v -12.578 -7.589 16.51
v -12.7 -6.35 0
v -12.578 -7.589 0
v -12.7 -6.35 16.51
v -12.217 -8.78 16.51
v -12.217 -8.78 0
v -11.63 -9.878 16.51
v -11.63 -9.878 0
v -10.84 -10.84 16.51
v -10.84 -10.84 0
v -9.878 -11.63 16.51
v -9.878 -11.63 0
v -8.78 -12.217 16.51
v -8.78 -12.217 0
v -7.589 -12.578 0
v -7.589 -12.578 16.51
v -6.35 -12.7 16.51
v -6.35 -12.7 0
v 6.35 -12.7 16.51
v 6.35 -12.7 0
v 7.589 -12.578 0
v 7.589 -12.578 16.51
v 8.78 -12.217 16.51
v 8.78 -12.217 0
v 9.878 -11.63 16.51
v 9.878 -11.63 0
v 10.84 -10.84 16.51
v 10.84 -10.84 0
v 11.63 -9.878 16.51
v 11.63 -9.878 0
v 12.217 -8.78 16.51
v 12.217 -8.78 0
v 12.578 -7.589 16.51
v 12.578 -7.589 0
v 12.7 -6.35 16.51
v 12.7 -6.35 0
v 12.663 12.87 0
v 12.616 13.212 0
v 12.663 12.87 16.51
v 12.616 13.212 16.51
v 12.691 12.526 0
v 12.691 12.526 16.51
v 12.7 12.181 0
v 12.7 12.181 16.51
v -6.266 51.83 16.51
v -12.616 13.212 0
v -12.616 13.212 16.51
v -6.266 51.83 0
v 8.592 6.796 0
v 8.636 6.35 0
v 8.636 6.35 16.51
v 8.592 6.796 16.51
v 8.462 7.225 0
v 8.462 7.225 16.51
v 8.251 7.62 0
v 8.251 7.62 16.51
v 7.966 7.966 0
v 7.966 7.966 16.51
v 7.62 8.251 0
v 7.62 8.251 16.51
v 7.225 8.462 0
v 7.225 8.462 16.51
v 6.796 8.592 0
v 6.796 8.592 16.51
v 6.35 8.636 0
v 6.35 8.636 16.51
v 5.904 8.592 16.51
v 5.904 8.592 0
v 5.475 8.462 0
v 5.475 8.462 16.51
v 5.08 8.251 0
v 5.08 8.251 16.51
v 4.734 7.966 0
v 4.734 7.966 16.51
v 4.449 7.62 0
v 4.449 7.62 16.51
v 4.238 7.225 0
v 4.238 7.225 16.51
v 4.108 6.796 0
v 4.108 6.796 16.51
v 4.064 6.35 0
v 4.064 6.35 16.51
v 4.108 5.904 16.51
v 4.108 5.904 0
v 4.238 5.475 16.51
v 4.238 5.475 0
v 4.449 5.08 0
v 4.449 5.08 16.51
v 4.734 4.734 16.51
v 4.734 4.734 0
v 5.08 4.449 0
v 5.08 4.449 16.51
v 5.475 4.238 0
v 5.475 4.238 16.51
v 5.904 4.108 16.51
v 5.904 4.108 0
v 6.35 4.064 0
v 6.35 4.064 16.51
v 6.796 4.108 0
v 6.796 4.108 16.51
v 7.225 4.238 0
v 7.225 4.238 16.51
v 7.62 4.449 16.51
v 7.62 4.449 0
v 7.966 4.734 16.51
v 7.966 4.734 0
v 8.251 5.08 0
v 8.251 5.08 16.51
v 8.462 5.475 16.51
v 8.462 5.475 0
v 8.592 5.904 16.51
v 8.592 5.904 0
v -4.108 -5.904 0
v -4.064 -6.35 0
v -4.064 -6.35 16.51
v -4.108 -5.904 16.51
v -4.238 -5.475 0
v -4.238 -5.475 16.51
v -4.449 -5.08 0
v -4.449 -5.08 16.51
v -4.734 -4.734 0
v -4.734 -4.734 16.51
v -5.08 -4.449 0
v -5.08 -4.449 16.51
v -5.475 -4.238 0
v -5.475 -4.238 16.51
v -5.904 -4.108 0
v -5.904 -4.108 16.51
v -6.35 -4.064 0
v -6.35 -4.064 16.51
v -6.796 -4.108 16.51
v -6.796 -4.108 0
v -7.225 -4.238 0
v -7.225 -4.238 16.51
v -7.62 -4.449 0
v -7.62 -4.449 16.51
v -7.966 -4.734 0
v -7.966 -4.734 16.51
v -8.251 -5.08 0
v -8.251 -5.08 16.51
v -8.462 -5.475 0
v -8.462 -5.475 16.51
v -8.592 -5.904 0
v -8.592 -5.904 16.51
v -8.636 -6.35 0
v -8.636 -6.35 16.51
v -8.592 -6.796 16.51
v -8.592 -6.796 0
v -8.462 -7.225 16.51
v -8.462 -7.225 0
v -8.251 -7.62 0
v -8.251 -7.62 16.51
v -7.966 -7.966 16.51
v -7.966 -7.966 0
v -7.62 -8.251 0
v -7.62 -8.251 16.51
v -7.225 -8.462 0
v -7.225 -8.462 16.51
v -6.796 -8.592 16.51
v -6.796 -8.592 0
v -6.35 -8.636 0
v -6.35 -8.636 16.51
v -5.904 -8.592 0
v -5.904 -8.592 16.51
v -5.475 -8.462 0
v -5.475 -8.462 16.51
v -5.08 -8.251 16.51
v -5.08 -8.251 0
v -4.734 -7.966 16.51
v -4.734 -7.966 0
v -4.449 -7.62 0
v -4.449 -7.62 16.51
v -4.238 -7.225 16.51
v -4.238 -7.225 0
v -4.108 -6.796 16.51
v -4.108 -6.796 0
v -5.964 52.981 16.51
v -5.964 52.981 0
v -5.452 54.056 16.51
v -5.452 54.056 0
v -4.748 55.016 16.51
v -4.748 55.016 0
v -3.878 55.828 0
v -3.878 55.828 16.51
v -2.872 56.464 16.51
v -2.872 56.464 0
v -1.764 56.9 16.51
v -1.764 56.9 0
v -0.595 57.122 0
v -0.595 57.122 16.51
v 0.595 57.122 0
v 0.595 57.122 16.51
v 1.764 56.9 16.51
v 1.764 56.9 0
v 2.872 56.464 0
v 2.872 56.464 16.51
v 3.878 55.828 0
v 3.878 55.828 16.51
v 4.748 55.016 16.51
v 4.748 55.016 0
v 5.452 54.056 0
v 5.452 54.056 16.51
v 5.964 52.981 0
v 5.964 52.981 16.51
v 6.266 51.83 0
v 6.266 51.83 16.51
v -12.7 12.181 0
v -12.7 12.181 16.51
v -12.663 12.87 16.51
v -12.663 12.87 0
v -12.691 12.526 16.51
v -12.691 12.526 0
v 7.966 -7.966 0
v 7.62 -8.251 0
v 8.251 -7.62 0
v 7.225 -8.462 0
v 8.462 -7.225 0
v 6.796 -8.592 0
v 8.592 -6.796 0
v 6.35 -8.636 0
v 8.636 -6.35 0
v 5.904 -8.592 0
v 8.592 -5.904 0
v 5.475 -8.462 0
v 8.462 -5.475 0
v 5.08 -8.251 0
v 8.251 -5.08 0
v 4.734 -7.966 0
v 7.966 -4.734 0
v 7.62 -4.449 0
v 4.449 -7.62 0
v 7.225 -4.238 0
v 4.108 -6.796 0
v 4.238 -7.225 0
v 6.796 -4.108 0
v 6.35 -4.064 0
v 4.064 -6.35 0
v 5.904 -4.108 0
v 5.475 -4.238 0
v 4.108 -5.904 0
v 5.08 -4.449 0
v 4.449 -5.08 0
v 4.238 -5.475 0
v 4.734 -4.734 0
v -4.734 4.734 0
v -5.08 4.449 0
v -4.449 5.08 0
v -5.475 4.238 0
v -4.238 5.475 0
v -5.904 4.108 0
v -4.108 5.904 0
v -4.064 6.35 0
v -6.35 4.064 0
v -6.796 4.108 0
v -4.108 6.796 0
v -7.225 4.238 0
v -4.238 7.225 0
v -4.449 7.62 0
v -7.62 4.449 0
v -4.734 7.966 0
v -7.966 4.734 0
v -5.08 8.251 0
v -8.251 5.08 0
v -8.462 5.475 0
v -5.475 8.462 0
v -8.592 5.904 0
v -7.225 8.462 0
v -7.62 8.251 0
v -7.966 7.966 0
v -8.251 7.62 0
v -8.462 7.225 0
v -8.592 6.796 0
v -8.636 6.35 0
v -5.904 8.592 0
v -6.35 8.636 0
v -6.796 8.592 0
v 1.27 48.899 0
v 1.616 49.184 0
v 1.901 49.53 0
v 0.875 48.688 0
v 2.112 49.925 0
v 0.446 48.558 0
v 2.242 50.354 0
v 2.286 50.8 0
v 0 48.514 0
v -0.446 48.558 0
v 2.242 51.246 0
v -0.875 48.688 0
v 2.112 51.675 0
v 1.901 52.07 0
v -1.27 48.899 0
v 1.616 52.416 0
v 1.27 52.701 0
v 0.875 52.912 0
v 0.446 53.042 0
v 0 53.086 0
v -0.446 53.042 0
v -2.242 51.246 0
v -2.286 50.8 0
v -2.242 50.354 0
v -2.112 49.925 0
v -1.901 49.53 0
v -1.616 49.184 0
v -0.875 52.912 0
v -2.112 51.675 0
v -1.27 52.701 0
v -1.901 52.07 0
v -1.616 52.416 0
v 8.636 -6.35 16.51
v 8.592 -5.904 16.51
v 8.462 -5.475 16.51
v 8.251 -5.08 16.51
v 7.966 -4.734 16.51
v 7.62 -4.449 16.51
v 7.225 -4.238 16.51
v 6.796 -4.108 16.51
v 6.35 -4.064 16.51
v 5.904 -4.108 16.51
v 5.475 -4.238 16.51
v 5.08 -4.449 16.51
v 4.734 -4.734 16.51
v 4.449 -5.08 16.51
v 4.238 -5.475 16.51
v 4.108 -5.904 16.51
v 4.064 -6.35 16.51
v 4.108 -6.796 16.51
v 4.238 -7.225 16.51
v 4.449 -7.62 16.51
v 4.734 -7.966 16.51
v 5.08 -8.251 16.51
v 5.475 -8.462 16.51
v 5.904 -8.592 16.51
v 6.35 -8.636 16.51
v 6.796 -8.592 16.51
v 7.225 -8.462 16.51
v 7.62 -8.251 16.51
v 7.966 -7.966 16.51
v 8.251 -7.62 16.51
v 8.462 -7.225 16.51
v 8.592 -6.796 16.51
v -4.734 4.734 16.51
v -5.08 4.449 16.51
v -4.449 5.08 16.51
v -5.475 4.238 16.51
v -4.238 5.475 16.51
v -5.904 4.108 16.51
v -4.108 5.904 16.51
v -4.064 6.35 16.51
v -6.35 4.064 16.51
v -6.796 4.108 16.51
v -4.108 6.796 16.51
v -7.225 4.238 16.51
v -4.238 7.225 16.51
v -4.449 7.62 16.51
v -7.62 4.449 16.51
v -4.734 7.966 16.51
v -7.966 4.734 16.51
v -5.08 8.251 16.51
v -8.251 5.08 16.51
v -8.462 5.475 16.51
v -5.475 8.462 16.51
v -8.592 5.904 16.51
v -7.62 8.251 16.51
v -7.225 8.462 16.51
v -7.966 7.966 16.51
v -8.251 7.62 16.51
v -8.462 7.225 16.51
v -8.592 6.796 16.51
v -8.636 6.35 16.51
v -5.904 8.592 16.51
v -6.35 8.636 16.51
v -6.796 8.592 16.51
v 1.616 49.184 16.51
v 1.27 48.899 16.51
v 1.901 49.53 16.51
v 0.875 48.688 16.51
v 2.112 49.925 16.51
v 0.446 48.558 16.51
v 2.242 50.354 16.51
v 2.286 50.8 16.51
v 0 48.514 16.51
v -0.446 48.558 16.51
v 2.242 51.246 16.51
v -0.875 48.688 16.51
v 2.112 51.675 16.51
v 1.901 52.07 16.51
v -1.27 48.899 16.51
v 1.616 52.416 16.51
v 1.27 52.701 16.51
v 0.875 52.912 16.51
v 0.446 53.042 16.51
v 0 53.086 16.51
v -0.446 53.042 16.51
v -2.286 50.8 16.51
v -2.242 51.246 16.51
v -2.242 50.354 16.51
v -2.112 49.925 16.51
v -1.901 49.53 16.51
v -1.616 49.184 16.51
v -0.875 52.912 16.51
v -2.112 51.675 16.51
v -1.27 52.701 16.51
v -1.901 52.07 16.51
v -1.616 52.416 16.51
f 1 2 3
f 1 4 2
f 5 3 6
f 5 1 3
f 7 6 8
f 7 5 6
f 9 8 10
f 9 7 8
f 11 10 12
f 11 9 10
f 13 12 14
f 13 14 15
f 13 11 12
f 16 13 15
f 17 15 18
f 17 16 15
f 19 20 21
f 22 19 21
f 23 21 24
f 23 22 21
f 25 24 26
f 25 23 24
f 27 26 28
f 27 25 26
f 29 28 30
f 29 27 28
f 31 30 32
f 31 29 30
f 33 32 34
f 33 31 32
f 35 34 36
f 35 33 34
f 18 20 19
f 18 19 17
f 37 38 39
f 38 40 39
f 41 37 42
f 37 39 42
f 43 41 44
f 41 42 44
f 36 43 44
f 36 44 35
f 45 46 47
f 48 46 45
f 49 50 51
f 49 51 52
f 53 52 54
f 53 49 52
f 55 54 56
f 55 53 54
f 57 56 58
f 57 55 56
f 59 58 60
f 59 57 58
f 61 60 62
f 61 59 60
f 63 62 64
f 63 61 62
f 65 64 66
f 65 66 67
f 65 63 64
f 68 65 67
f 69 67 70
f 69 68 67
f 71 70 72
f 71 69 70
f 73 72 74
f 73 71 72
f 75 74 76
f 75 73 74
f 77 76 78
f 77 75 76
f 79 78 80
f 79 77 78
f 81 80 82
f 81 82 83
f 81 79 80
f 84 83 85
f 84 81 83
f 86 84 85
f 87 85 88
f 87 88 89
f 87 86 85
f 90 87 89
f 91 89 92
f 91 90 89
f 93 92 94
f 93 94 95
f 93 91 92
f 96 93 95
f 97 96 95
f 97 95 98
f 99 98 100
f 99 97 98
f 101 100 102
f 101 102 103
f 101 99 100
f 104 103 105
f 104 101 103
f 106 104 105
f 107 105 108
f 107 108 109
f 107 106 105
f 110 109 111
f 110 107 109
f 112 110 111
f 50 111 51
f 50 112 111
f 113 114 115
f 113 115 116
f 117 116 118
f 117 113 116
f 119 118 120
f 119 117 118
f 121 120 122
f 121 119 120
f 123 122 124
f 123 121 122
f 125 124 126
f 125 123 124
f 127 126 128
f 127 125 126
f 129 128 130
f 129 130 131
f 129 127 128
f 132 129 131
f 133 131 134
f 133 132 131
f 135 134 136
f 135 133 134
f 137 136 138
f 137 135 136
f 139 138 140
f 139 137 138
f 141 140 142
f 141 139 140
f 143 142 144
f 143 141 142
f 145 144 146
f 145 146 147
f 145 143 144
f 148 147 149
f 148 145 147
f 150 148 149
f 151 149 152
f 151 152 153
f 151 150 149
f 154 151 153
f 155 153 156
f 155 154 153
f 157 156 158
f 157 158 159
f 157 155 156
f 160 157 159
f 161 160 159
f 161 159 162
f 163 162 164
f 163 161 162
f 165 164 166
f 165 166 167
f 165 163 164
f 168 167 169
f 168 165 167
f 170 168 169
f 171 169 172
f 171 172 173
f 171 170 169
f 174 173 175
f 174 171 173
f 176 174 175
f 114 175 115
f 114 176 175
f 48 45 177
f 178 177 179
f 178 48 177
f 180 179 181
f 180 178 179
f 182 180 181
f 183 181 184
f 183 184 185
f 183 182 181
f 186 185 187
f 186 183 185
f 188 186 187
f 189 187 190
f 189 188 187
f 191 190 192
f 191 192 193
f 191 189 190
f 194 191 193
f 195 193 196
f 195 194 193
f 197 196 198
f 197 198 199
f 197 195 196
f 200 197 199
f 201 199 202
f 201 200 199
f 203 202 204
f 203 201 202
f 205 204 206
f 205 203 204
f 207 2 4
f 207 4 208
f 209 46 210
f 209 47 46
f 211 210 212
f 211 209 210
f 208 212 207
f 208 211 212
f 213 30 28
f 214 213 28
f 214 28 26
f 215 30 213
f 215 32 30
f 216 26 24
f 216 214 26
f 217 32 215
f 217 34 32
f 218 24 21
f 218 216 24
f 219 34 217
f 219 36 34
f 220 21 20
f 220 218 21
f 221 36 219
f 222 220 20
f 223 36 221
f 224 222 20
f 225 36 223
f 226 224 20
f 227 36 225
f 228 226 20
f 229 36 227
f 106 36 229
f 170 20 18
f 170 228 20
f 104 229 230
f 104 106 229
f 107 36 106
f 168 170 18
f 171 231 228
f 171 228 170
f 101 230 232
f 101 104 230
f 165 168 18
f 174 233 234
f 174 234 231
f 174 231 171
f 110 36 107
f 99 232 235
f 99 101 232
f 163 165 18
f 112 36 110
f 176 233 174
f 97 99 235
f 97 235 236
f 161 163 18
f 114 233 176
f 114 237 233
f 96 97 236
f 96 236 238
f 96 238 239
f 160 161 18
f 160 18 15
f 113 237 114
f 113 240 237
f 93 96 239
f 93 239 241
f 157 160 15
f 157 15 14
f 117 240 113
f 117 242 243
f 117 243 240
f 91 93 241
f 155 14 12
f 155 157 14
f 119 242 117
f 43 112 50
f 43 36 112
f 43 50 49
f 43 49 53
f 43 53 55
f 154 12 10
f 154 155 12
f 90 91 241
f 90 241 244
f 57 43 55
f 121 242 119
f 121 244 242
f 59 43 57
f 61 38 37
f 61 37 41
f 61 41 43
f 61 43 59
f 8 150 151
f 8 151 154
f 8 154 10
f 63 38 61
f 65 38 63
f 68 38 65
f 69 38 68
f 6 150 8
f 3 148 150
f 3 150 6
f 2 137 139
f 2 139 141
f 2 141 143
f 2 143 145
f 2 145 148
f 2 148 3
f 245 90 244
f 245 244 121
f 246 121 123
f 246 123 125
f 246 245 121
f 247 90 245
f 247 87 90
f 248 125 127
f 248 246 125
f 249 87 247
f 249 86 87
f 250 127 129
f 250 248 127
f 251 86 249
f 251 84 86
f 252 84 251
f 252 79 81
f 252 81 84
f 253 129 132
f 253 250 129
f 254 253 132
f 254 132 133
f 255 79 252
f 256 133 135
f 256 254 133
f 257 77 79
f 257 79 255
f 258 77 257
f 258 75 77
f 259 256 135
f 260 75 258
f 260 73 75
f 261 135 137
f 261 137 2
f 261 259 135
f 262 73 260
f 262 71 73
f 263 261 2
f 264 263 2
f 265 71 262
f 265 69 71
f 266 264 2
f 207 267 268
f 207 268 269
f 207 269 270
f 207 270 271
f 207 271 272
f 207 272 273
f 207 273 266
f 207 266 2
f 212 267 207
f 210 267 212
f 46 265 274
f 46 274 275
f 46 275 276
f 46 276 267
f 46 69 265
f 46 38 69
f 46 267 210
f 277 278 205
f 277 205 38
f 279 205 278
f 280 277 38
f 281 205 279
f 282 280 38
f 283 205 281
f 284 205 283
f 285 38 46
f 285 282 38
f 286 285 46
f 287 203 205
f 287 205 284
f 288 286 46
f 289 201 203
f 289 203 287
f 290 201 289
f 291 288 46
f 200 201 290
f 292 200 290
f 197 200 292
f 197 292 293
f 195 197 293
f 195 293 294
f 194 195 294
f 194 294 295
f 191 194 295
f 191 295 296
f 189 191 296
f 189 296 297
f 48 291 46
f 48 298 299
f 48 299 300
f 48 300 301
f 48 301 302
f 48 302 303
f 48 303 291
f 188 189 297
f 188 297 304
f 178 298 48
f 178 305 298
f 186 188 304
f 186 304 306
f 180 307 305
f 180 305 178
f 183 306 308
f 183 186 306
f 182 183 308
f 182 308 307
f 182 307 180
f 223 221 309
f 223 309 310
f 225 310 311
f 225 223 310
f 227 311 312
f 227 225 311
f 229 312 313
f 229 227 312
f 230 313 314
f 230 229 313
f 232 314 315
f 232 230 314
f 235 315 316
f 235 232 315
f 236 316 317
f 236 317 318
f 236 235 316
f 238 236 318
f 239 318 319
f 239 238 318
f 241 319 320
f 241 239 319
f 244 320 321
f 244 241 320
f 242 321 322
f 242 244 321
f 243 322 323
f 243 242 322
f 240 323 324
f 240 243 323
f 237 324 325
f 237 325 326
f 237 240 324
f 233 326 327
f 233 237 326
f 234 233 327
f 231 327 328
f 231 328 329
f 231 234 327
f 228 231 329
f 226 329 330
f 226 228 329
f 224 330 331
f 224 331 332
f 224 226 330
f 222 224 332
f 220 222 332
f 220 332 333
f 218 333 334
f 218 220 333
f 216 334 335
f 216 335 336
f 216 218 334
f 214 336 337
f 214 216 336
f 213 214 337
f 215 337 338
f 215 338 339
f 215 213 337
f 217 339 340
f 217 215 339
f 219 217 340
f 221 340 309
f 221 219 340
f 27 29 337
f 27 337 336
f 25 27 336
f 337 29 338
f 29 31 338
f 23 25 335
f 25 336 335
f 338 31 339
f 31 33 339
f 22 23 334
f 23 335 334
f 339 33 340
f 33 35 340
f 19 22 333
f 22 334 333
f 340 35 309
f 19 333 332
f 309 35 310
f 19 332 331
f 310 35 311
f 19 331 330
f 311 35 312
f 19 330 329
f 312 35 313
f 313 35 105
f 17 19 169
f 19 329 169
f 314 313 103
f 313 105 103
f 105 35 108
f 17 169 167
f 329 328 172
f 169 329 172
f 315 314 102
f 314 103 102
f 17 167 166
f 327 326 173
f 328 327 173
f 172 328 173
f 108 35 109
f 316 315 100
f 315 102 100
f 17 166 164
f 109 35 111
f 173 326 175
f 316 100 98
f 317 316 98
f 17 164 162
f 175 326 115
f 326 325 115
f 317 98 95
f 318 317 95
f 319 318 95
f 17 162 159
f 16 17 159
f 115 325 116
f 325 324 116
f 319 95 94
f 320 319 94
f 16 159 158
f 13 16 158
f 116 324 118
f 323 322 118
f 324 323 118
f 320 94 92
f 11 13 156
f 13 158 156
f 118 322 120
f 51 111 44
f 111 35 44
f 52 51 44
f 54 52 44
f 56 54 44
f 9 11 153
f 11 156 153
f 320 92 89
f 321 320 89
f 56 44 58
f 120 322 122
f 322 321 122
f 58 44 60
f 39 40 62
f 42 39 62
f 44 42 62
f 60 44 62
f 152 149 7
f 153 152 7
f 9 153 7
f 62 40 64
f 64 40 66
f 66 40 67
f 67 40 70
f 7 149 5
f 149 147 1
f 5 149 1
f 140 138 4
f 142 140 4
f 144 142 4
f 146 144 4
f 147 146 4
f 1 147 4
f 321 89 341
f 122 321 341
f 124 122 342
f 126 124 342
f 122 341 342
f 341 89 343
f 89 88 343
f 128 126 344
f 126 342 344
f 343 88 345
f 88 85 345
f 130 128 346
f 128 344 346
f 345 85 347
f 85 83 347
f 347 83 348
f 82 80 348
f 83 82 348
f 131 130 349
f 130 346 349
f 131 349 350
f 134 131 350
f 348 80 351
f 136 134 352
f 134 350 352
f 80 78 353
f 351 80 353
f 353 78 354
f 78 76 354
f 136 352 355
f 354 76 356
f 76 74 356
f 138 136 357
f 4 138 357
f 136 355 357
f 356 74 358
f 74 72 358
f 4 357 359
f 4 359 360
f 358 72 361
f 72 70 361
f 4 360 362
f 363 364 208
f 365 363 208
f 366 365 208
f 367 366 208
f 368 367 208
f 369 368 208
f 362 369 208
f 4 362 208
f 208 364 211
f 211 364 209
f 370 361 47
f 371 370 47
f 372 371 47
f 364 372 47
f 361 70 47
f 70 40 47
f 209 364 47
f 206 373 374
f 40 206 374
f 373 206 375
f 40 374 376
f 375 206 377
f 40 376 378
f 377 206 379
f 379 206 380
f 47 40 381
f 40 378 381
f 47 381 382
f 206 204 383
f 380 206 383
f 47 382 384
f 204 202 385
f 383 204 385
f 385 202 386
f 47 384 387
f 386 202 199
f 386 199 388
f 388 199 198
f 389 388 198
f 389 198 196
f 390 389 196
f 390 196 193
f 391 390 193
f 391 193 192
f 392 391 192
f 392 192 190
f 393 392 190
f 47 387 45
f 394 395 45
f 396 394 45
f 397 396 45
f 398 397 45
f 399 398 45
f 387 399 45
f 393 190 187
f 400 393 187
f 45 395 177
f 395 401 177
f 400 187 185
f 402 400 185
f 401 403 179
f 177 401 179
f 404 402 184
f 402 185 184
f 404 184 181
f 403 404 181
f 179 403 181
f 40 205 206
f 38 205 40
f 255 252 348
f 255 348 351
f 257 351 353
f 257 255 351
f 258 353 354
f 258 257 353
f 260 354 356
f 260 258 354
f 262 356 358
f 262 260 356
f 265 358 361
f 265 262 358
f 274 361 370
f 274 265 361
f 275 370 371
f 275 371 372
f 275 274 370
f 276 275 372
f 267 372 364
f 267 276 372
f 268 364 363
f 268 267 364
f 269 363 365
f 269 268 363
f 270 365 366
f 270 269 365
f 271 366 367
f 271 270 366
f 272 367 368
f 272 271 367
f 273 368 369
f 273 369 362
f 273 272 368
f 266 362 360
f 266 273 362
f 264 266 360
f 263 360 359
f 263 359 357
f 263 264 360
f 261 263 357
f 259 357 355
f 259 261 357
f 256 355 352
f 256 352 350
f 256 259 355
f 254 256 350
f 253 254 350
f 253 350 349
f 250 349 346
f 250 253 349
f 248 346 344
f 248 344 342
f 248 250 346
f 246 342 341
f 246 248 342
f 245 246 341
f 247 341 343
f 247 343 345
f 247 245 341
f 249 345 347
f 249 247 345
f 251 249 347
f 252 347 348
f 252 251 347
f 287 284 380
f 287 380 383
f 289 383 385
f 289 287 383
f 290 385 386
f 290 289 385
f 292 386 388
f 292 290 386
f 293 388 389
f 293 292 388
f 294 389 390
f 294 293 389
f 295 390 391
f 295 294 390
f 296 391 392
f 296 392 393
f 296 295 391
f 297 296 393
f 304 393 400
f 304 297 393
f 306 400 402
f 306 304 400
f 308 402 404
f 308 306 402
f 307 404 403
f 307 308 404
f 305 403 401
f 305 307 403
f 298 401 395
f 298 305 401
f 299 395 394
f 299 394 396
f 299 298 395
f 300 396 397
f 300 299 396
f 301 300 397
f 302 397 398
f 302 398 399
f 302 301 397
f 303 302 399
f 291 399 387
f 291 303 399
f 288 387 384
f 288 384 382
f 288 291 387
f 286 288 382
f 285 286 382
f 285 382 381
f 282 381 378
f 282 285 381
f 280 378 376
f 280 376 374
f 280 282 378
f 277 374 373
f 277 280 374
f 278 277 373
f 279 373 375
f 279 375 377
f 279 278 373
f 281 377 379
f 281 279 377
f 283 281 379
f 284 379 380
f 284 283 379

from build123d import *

# Parameters (mm, degrees)
SKETCH1_R           = 2.286
BOSS_EXTRUDE1_DEPTH = 16.51
FILLET1_R           = 6.35


with BuildPart() as part:
    # Sketch1 → Boss-Extrude1 (new body)
    with BuildSketch(Plane.XY):
        with BuildLine():
            Line((-12.7, 12.7), (-6.265860593, 51.830286864))
            ThreePointArc((-6.265860593, 51.830286864), (0, 57.15), (6.265860593, 51.830286864))
            Line((6.265860593, 51.830286864), (12.7, 12.7))
            Line((12.7, 12.7), (12.7, -12.7))
            Line((12.7, -12.7), (-12.7, -12.7))
            Line((-12.7, -12.7), (-12.7, 12.7))
        make_face()
        with Locations((-6.35, -6.35)):
            Circle(SKETCH1_R, mode=Mode.SUBTRACT)
        with Locations((0, 50.8)):
            Circle(SKETCH1_R, mode=Mode.SUBTRACT)
        with Locations((6.35, -6.35)):
            Circle(SKETCH1_R, mode=Mode.SUBTRACT)
        with Locations((6.35, 6.35)):
            Circle(SKETCH1_R, mode=Mode.SUBTRACT)
        with Locations((-6.35, 6.35)):
            Circle(SKETCH1_R, mode=Mode.SUBTRACT)
    extrude(amount=BOSS_EXTRUDE1_DEPTH)

    # Fillet1
    fillet1_edges = [part.edges().sort_by_distance(p)[0] for p in [
        (-12.7, 12.7, 8.255),
        (12.7, 12.7, 8.255),
        (12.7, -12.7, 8.255),
        (-12.7, -12.7, 8.255),
    ]]
    fillet(fillet1_edges, radius=FILLET1_R)


solid = part.part
